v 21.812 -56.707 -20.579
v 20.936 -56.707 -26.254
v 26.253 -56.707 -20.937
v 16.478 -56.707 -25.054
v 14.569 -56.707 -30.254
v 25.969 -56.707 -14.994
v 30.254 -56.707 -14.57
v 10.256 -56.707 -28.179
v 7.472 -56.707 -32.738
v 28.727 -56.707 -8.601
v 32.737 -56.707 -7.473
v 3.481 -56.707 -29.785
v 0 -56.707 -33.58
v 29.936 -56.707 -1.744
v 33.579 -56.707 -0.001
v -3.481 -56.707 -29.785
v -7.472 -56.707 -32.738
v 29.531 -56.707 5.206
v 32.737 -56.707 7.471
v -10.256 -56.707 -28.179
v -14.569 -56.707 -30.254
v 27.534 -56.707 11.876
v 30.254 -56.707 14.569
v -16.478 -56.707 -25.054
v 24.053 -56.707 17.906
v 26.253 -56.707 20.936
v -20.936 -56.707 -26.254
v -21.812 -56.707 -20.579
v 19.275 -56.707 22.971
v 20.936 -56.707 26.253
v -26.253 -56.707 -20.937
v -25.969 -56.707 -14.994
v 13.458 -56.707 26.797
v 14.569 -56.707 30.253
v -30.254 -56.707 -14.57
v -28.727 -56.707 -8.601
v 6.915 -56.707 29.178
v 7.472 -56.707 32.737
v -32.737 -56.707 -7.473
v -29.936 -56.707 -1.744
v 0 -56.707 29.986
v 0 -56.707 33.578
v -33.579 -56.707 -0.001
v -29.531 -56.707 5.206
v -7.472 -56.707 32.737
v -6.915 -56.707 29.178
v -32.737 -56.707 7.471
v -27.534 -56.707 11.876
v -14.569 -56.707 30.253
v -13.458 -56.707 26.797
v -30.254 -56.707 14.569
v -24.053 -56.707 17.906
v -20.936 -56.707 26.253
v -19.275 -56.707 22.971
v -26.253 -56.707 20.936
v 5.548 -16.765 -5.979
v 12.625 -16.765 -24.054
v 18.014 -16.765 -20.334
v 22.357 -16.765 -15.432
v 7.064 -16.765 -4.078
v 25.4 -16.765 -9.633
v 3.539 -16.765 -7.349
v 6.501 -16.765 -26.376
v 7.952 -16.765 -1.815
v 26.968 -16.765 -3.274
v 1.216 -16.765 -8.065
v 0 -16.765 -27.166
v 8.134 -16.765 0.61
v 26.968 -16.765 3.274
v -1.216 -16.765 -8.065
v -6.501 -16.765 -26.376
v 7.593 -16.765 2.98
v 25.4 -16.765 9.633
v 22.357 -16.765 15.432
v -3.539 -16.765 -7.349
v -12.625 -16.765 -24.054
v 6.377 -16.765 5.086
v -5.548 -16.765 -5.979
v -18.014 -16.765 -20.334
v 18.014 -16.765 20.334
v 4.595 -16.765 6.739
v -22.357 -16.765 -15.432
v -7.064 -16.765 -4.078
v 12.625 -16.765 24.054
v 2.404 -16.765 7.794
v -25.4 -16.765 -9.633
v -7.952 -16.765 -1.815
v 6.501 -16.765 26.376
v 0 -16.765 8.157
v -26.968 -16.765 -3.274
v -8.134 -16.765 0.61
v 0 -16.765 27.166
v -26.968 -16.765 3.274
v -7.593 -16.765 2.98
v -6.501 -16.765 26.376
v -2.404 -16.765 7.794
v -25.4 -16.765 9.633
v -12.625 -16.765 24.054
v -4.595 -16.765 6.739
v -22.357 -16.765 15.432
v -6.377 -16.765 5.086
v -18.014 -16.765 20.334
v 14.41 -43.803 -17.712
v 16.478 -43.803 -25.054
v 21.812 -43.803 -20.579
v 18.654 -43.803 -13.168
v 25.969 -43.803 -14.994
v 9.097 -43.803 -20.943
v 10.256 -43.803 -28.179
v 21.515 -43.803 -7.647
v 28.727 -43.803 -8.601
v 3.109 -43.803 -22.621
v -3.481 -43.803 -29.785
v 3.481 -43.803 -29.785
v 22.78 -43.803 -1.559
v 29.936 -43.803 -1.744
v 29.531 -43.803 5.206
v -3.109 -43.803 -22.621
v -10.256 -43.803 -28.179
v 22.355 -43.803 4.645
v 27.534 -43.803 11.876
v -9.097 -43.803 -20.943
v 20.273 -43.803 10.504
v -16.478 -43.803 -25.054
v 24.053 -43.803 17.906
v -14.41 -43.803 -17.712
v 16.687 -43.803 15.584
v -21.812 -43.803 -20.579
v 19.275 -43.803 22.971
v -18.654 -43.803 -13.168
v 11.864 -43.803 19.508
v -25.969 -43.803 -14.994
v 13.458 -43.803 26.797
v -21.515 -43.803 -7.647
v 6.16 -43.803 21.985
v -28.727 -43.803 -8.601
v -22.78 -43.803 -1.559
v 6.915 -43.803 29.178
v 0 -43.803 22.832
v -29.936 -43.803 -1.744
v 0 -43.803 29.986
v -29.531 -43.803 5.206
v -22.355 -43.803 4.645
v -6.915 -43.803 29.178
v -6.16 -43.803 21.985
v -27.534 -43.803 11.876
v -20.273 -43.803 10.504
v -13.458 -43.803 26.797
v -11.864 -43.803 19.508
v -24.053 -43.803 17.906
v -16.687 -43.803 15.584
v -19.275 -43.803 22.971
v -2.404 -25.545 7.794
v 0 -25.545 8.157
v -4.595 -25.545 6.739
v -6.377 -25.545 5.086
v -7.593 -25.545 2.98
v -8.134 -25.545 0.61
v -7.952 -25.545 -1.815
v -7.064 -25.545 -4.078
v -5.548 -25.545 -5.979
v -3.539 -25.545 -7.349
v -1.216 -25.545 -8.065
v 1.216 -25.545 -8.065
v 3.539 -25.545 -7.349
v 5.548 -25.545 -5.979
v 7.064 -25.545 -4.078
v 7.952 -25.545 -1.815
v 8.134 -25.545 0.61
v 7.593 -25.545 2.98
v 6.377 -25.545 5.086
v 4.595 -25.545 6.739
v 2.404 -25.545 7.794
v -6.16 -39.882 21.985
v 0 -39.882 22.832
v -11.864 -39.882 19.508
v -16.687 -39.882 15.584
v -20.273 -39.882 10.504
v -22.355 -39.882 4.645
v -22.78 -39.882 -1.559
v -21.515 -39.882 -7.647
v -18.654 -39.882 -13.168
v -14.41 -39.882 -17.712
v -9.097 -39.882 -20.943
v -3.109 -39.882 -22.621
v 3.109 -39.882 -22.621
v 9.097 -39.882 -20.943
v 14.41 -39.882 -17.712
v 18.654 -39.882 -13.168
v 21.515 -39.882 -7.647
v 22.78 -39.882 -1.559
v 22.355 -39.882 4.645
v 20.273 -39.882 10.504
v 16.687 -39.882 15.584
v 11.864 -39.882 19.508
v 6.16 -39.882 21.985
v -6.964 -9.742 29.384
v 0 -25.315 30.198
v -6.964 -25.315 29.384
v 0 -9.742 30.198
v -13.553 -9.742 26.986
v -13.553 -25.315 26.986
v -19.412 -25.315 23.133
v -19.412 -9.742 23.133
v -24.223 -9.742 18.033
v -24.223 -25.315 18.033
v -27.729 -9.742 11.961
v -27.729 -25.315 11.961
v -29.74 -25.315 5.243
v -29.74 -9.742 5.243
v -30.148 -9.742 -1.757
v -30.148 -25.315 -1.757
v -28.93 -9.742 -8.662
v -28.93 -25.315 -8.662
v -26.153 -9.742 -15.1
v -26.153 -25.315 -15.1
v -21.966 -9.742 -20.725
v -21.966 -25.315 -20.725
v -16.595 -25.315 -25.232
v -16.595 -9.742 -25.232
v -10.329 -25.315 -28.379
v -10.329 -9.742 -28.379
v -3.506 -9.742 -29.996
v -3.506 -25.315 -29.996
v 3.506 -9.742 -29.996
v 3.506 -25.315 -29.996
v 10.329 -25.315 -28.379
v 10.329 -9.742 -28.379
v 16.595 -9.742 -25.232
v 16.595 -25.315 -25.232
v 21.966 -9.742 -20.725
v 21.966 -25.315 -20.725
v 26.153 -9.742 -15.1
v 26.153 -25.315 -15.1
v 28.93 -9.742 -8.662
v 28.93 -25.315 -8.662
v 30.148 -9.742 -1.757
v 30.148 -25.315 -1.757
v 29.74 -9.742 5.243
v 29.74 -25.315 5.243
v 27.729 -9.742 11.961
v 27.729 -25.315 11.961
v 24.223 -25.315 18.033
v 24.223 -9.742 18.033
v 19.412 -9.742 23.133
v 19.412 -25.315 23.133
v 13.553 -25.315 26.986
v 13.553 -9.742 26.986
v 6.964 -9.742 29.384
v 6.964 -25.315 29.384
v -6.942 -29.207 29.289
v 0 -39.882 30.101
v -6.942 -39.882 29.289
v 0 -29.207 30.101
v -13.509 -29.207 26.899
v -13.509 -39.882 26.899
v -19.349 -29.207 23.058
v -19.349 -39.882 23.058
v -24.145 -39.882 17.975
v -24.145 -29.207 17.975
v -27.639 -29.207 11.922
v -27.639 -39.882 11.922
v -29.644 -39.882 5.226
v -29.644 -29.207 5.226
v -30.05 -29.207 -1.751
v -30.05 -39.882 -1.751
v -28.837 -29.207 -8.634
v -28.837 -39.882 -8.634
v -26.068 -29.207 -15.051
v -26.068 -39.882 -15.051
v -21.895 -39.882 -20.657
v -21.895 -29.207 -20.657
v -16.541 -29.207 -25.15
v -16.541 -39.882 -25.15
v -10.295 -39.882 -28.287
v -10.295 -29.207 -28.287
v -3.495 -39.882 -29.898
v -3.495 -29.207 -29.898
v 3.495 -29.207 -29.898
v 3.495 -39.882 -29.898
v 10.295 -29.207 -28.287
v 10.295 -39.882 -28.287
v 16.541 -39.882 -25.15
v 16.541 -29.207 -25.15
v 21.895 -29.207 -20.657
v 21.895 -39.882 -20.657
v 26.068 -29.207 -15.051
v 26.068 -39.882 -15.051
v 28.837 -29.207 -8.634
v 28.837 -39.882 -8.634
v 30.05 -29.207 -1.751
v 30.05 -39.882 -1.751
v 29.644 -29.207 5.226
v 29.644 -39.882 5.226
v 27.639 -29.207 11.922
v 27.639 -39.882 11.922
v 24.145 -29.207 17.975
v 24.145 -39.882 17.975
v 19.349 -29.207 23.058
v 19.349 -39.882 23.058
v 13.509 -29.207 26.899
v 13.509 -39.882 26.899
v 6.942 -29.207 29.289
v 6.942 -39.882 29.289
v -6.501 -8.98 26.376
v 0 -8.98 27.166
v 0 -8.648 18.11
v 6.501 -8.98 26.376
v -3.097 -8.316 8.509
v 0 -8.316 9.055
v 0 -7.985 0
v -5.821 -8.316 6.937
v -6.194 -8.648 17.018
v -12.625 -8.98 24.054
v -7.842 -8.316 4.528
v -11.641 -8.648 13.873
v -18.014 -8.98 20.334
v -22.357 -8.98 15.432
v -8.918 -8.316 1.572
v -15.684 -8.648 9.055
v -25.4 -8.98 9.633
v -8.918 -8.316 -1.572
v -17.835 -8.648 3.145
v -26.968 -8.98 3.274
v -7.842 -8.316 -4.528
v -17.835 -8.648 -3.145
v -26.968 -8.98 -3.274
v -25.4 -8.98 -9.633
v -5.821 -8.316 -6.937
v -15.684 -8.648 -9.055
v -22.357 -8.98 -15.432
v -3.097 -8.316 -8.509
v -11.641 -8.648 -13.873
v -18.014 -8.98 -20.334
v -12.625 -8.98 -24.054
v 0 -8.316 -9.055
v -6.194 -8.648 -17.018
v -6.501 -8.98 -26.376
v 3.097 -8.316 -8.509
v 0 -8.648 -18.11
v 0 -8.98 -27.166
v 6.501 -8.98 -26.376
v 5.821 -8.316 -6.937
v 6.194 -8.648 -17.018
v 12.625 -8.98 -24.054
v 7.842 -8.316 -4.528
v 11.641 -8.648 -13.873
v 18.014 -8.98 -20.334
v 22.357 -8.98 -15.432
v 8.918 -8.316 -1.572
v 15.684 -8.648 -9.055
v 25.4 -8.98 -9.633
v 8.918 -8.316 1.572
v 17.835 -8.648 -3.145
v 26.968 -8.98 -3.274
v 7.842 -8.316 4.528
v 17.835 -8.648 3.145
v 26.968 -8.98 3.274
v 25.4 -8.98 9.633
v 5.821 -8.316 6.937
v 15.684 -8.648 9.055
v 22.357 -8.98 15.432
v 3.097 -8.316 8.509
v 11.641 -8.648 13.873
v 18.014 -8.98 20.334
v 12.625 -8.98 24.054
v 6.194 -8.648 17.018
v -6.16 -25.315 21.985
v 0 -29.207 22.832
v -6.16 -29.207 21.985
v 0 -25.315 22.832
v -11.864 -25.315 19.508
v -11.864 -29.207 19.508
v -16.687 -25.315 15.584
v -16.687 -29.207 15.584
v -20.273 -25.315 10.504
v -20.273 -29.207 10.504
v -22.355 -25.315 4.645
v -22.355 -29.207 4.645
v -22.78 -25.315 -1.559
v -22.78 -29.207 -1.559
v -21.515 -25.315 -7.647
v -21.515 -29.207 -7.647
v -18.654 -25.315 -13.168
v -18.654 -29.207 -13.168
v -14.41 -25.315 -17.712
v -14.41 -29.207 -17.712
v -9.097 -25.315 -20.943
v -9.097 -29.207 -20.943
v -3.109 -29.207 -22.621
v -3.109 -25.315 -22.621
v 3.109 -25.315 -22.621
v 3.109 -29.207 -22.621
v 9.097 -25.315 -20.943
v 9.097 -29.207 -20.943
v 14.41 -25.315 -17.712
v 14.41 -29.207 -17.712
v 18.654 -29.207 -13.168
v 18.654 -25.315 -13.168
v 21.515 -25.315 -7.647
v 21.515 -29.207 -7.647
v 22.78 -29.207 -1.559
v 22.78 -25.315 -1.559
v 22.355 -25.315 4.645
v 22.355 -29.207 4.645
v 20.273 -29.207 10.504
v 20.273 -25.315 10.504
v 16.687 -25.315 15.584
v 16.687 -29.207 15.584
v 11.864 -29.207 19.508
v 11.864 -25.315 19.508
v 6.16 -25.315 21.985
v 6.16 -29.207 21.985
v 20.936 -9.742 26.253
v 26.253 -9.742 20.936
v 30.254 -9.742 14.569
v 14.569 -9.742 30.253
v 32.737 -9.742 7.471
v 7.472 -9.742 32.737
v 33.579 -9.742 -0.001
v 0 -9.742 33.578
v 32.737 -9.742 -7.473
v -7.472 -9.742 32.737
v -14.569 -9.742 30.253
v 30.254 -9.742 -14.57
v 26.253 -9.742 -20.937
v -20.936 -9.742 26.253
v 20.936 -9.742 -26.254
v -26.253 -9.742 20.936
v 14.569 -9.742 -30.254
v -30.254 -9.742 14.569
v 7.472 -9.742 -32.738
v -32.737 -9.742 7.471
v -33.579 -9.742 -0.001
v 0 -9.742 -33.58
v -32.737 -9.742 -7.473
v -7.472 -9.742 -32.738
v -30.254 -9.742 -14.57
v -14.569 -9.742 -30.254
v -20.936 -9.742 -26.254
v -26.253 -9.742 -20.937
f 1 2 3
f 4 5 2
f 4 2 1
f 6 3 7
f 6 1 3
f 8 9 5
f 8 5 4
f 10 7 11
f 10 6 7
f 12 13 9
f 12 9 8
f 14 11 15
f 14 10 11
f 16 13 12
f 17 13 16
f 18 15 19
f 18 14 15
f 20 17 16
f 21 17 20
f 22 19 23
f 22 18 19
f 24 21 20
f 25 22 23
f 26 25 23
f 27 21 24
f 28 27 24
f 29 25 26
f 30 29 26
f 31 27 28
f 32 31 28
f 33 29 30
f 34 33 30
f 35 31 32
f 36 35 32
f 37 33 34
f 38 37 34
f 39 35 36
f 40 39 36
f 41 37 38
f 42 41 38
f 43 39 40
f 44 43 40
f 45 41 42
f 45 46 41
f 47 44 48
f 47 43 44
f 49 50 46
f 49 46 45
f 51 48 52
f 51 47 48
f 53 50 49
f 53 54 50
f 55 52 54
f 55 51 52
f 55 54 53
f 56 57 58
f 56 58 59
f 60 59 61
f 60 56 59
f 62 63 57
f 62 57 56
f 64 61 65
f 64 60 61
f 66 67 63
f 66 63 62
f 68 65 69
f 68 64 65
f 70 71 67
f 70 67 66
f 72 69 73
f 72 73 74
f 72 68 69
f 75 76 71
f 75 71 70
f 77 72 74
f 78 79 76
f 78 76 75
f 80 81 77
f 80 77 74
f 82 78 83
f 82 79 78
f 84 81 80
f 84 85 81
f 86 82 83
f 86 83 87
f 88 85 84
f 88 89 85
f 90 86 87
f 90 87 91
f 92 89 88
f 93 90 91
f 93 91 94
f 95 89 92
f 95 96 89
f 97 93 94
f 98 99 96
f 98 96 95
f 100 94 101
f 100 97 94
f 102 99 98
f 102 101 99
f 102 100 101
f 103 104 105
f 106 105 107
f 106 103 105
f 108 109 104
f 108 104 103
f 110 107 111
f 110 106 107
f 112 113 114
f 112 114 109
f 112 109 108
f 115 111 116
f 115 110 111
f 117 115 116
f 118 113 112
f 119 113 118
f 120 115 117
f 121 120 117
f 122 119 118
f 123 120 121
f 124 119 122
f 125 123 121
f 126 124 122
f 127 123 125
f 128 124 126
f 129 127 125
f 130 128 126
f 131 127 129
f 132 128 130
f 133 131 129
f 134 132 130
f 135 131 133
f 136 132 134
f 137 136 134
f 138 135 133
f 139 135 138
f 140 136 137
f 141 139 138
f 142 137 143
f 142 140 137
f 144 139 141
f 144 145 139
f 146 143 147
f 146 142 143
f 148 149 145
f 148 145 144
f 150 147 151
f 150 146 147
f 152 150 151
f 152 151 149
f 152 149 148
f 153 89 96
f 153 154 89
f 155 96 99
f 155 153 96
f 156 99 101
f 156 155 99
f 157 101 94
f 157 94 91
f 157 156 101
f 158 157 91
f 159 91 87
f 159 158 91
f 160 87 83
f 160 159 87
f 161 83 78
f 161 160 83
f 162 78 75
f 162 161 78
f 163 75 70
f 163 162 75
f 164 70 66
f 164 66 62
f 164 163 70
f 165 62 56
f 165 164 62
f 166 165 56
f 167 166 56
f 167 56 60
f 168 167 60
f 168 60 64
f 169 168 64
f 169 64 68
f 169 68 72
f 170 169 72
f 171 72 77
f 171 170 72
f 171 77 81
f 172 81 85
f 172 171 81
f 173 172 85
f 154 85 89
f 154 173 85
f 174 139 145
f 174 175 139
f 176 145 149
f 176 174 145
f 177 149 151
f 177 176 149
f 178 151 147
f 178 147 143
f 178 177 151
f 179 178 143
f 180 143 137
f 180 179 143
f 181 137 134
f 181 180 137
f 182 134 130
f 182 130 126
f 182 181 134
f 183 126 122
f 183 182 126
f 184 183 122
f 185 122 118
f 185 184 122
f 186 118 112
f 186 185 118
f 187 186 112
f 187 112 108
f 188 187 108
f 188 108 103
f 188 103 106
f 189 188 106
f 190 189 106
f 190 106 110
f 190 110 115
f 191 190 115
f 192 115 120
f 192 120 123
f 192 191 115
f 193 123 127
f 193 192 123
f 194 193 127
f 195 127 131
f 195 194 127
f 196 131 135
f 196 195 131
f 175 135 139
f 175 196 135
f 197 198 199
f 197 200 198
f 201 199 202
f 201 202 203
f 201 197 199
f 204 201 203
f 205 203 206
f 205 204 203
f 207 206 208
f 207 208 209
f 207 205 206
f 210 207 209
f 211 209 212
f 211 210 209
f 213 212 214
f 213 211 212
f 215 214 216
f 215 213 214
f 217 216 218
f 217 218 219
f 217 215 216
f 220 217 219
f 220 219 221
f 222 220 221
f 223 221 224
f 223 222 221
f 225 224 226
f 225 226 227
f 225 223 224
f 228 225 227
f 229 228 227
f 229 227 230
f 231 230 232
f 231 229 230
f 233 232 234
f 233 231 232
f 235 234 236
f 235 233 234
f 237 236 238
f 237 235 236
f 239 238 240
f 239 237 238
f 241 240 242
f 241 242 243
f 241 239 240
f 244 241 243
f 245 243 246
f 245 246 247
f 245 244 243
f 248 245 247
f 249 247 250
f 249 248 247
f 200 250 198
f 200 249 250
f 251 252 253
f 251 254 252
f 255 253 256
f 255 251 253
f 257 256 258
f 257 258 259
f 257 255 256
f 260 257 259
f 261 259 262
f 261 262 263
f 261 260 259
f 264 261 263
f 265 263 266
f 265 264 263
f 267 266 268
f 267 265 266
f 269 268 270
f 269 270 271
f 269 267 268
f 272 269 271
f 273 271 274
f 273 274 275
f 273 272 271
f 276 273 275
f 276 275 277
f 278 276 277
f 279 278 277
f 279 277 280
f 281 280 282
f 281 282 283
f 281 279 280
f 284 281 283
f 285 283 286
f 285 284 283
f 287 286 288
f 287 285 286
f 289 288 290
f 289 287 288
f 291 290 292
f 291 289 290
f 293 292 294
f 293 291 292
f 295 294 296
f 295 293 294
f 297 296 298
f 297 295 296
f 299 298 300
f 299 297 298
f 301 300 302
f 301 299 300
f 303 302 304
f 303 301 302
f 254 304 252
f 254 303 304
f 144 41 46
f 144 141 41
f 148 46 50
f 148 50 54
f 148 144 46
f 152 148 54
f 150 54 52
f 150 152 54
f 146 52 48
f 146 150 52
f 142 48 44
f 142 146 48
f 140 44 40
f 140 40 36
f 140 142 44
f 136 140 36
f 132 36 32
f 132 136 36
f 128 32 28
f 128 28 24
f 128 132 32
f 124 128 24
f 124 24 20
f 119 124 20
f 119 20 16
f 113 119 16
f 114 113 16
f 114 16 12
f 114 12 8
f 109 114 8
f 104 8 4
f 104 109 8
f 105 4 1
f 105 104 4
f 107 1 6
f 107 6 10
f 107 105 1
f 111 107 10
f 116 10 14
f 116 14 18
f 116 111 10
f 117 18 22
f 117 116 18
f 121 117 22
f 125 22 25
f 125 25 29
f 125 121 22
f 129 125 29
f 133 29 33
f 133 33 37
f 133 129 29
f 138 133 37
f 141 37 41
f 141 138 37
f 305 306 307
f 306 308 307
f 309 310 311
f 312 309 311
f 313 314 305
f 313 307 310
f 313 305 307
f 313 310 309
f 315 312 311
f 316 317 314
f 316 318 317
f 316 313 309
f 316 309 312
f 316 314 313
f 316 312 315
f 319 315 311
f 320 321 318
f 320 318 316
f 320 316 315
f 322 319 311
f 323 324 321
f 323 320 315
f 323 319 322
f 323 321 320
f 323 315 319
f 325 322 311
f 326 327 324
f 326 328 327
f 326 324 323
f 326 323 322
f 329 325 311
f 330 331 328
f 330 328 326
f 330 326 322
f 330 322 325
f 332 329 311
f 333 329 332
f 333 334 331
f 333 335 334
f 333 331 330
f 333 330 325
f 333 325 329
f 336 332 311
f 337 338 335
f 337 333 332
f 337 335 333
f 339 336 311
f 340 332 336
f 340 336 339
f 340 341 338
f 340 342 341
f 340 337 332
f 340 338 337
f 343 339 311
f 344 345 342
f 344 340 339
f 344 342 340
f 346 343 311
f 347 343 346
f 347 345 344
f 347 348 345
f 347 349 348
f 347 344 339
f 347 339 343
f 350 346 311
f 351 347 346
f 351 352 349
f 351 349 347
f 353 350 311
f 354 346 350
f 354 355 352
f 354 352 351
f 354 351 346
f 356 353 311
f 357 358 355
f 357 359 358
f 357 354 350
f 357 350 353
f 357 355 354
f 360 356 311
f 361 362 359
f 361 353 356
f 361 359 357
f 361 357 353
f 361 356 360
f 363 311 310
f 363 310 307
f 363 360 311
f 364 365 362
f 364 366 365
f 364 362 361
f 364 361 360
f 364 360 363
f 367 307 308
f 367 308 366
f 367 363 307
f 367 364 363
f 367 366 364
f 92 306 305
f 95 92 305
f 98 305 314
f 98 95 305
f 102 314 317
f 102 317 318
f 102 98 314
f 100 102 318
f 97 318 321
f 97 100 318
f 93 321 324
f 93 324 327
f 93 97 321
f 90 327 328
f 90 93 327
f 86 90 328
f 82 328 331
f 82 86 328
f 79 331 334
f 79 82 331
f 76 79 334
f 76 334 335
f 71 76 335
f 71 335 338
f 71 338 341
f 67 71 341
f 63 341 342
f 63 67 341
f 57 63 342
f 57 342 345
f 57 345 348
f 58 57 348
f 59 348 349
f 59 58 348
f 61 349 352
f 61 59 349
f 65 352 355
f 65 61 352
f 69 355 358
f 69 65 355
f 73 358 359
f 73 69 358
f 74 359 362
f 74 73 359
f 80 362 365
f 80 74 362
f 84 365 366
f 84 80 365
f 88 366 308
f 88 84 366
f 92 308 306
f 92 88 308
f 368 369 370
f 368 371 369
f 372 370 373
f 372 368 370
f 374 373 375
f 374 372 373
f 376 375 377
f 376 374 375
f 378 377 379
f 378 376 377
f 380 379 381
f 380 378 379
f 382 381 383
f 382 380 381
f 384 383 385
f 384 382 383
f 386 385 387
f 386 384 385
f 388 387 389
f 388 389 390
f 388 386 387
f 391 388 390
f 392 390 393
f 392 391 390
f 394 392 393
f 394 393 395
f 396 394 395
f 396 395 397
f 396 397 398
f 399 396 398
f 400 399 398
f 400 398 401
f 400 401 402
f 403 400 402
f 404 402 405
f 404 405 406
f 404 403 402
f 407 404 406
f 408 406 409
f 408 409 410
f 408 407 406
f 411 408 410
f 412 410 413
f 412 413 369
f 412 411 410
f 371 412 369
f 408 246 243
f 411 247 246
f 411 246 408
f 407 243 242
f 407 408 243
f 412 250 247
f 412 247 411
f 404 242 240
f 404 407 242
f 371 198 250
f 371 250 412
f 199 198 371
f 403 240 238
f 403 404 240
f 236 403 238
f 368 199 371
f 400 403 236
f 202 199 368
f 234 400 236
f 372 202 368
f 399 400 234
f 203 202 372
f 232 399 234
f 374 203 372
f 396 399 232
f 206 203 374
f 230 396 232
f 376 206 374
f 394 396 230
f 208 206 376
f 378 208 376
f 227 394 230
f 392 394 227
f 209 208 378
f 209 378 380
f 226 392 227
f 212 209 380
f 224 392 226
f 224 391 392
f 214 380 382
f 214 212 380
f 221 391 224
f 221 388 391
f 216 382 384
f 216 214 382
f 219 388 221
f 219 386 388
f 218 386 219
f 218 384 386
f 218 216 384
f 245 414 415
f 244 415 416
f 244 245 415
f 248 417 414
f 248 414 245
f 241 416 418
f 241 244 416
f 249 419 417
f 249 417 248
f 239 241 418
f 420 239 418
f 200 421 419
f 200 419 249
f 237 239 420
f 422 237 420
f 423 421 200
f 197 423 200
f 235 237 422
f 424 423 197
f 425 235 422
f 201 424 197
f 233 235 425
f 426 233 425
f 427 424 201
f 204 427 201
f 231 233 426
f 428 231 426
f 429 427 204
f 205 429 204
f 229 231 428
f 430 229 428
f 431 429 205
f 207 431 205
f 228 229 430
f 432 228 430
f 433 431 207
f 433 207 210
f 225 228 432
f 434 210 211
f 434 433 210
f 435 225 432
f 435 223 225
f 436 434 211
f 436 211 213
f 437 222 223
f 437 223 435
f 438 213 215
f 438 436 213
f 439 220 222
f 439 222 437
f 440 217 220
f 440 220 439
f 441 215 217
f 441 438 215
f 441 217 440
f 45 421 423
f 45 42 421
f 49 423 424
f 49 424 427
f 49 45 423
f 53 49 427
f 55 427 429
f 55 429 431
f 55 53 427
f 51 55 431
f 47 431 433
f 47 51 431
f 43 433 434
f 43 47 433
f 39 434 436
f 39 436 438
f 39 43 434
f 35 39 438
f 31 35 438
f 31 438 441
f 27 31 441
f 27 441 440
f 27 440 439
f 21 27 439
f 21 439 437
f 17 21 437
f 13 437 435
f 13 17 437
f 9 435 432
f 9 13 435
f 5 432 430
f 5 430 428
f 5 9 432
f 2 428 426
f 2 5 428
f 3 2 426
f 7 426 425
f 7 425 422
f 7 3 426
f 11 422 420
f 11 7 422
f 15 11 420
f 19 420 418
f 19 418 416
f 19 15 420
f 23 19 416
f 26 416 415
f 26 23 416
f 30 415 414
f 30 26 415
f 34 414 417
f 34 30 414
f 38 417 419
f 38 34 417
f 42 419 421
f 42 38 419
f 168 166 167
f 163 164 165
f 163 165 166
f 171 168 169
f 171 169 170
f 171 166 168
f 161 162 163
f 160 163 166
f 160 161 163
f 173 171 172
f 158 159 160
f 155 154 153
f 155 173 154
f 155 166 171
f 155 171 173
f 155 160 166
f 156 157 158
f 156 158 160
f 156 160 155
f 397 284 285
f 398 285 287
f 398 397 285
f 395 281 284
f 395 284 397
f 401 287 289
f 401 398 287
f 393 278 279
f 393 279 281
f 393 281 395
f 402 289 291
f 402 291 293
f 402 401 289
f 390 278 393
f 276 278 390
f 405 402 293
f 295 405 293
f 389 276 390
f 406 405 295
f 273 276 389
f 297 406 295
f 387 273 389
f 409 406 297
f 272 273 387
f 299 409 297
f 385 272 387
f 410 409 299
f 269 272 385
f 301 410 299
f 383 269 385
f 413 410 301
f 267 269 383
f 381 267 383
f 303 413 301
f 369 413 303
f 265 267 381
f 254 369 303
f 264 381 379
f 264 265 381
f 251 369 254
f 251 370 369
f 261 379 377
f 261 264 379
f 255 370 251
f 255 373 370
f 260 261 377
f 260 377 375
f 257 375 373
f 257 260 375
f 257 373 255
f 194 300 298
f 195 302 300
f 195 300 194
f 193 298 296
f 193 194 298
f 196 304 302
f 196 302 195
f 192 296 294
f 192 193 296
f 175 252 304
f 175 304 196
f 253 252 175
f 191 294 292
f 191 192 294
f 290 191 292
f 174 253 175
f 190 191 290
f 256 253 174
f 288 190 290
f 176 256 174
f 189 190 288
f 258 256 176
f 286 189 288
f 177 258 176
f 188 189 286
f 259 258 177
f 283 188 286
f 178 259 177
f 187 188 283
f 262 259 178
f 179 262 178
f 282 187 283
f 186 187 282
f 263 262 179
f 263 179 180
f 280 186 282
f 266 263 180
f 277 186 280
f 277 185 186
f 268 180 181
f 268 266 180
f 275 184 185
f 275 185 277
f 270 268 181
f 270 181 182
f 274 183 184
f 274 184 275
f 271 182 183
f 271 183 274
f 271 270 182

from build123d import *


with BuildPart() as f1:
    # F0 (on Right) → F1 (revolve)
    with BuildSketch(Plane.YZ):
        Polygon((-25.5454182625, 0), (-7.984559983, 0), (-8.9802779257, 27.165742591), (-16.7649891227, 27.165742591), (-16.7649891227, 8.156567812), (-25.5454182625, 8.156567812), align=None)
    revolve(axis=Axis((0, -16.7649891227, 0), (0, -1, 0)))


with BuildPart() as f3:
    # F2 (on Right) → F3 (revolve)
    with BuildSketch(Plane.YZ):
        Polygon((-25.3146700561, 30.1983803511), (-9.7422320396, 30.1983803511), (-9.7422320396, 33.5784740746), (-18.8029632679, 33.5784740746), (-56.7066520452, 33.5784740746), (-56.7066520452, 29.9861170352), (-43.8025183976, 29.9861170352), (-43.8025183976, 22.8321645409), (-39.8822762072, 22.8321645409), (-39.8822762072, 30.1005579531), (-29.2070619762, 30.1005579531), (-29.2070619762, 22.8321645409), (-25.3146700561, 22.8321645409), align=None)
    revolve(axis=Axis((0, -29.852210544, -0.0006835908), (0, -1, 0)))


solid = Compound([f1.part, f3.part])
